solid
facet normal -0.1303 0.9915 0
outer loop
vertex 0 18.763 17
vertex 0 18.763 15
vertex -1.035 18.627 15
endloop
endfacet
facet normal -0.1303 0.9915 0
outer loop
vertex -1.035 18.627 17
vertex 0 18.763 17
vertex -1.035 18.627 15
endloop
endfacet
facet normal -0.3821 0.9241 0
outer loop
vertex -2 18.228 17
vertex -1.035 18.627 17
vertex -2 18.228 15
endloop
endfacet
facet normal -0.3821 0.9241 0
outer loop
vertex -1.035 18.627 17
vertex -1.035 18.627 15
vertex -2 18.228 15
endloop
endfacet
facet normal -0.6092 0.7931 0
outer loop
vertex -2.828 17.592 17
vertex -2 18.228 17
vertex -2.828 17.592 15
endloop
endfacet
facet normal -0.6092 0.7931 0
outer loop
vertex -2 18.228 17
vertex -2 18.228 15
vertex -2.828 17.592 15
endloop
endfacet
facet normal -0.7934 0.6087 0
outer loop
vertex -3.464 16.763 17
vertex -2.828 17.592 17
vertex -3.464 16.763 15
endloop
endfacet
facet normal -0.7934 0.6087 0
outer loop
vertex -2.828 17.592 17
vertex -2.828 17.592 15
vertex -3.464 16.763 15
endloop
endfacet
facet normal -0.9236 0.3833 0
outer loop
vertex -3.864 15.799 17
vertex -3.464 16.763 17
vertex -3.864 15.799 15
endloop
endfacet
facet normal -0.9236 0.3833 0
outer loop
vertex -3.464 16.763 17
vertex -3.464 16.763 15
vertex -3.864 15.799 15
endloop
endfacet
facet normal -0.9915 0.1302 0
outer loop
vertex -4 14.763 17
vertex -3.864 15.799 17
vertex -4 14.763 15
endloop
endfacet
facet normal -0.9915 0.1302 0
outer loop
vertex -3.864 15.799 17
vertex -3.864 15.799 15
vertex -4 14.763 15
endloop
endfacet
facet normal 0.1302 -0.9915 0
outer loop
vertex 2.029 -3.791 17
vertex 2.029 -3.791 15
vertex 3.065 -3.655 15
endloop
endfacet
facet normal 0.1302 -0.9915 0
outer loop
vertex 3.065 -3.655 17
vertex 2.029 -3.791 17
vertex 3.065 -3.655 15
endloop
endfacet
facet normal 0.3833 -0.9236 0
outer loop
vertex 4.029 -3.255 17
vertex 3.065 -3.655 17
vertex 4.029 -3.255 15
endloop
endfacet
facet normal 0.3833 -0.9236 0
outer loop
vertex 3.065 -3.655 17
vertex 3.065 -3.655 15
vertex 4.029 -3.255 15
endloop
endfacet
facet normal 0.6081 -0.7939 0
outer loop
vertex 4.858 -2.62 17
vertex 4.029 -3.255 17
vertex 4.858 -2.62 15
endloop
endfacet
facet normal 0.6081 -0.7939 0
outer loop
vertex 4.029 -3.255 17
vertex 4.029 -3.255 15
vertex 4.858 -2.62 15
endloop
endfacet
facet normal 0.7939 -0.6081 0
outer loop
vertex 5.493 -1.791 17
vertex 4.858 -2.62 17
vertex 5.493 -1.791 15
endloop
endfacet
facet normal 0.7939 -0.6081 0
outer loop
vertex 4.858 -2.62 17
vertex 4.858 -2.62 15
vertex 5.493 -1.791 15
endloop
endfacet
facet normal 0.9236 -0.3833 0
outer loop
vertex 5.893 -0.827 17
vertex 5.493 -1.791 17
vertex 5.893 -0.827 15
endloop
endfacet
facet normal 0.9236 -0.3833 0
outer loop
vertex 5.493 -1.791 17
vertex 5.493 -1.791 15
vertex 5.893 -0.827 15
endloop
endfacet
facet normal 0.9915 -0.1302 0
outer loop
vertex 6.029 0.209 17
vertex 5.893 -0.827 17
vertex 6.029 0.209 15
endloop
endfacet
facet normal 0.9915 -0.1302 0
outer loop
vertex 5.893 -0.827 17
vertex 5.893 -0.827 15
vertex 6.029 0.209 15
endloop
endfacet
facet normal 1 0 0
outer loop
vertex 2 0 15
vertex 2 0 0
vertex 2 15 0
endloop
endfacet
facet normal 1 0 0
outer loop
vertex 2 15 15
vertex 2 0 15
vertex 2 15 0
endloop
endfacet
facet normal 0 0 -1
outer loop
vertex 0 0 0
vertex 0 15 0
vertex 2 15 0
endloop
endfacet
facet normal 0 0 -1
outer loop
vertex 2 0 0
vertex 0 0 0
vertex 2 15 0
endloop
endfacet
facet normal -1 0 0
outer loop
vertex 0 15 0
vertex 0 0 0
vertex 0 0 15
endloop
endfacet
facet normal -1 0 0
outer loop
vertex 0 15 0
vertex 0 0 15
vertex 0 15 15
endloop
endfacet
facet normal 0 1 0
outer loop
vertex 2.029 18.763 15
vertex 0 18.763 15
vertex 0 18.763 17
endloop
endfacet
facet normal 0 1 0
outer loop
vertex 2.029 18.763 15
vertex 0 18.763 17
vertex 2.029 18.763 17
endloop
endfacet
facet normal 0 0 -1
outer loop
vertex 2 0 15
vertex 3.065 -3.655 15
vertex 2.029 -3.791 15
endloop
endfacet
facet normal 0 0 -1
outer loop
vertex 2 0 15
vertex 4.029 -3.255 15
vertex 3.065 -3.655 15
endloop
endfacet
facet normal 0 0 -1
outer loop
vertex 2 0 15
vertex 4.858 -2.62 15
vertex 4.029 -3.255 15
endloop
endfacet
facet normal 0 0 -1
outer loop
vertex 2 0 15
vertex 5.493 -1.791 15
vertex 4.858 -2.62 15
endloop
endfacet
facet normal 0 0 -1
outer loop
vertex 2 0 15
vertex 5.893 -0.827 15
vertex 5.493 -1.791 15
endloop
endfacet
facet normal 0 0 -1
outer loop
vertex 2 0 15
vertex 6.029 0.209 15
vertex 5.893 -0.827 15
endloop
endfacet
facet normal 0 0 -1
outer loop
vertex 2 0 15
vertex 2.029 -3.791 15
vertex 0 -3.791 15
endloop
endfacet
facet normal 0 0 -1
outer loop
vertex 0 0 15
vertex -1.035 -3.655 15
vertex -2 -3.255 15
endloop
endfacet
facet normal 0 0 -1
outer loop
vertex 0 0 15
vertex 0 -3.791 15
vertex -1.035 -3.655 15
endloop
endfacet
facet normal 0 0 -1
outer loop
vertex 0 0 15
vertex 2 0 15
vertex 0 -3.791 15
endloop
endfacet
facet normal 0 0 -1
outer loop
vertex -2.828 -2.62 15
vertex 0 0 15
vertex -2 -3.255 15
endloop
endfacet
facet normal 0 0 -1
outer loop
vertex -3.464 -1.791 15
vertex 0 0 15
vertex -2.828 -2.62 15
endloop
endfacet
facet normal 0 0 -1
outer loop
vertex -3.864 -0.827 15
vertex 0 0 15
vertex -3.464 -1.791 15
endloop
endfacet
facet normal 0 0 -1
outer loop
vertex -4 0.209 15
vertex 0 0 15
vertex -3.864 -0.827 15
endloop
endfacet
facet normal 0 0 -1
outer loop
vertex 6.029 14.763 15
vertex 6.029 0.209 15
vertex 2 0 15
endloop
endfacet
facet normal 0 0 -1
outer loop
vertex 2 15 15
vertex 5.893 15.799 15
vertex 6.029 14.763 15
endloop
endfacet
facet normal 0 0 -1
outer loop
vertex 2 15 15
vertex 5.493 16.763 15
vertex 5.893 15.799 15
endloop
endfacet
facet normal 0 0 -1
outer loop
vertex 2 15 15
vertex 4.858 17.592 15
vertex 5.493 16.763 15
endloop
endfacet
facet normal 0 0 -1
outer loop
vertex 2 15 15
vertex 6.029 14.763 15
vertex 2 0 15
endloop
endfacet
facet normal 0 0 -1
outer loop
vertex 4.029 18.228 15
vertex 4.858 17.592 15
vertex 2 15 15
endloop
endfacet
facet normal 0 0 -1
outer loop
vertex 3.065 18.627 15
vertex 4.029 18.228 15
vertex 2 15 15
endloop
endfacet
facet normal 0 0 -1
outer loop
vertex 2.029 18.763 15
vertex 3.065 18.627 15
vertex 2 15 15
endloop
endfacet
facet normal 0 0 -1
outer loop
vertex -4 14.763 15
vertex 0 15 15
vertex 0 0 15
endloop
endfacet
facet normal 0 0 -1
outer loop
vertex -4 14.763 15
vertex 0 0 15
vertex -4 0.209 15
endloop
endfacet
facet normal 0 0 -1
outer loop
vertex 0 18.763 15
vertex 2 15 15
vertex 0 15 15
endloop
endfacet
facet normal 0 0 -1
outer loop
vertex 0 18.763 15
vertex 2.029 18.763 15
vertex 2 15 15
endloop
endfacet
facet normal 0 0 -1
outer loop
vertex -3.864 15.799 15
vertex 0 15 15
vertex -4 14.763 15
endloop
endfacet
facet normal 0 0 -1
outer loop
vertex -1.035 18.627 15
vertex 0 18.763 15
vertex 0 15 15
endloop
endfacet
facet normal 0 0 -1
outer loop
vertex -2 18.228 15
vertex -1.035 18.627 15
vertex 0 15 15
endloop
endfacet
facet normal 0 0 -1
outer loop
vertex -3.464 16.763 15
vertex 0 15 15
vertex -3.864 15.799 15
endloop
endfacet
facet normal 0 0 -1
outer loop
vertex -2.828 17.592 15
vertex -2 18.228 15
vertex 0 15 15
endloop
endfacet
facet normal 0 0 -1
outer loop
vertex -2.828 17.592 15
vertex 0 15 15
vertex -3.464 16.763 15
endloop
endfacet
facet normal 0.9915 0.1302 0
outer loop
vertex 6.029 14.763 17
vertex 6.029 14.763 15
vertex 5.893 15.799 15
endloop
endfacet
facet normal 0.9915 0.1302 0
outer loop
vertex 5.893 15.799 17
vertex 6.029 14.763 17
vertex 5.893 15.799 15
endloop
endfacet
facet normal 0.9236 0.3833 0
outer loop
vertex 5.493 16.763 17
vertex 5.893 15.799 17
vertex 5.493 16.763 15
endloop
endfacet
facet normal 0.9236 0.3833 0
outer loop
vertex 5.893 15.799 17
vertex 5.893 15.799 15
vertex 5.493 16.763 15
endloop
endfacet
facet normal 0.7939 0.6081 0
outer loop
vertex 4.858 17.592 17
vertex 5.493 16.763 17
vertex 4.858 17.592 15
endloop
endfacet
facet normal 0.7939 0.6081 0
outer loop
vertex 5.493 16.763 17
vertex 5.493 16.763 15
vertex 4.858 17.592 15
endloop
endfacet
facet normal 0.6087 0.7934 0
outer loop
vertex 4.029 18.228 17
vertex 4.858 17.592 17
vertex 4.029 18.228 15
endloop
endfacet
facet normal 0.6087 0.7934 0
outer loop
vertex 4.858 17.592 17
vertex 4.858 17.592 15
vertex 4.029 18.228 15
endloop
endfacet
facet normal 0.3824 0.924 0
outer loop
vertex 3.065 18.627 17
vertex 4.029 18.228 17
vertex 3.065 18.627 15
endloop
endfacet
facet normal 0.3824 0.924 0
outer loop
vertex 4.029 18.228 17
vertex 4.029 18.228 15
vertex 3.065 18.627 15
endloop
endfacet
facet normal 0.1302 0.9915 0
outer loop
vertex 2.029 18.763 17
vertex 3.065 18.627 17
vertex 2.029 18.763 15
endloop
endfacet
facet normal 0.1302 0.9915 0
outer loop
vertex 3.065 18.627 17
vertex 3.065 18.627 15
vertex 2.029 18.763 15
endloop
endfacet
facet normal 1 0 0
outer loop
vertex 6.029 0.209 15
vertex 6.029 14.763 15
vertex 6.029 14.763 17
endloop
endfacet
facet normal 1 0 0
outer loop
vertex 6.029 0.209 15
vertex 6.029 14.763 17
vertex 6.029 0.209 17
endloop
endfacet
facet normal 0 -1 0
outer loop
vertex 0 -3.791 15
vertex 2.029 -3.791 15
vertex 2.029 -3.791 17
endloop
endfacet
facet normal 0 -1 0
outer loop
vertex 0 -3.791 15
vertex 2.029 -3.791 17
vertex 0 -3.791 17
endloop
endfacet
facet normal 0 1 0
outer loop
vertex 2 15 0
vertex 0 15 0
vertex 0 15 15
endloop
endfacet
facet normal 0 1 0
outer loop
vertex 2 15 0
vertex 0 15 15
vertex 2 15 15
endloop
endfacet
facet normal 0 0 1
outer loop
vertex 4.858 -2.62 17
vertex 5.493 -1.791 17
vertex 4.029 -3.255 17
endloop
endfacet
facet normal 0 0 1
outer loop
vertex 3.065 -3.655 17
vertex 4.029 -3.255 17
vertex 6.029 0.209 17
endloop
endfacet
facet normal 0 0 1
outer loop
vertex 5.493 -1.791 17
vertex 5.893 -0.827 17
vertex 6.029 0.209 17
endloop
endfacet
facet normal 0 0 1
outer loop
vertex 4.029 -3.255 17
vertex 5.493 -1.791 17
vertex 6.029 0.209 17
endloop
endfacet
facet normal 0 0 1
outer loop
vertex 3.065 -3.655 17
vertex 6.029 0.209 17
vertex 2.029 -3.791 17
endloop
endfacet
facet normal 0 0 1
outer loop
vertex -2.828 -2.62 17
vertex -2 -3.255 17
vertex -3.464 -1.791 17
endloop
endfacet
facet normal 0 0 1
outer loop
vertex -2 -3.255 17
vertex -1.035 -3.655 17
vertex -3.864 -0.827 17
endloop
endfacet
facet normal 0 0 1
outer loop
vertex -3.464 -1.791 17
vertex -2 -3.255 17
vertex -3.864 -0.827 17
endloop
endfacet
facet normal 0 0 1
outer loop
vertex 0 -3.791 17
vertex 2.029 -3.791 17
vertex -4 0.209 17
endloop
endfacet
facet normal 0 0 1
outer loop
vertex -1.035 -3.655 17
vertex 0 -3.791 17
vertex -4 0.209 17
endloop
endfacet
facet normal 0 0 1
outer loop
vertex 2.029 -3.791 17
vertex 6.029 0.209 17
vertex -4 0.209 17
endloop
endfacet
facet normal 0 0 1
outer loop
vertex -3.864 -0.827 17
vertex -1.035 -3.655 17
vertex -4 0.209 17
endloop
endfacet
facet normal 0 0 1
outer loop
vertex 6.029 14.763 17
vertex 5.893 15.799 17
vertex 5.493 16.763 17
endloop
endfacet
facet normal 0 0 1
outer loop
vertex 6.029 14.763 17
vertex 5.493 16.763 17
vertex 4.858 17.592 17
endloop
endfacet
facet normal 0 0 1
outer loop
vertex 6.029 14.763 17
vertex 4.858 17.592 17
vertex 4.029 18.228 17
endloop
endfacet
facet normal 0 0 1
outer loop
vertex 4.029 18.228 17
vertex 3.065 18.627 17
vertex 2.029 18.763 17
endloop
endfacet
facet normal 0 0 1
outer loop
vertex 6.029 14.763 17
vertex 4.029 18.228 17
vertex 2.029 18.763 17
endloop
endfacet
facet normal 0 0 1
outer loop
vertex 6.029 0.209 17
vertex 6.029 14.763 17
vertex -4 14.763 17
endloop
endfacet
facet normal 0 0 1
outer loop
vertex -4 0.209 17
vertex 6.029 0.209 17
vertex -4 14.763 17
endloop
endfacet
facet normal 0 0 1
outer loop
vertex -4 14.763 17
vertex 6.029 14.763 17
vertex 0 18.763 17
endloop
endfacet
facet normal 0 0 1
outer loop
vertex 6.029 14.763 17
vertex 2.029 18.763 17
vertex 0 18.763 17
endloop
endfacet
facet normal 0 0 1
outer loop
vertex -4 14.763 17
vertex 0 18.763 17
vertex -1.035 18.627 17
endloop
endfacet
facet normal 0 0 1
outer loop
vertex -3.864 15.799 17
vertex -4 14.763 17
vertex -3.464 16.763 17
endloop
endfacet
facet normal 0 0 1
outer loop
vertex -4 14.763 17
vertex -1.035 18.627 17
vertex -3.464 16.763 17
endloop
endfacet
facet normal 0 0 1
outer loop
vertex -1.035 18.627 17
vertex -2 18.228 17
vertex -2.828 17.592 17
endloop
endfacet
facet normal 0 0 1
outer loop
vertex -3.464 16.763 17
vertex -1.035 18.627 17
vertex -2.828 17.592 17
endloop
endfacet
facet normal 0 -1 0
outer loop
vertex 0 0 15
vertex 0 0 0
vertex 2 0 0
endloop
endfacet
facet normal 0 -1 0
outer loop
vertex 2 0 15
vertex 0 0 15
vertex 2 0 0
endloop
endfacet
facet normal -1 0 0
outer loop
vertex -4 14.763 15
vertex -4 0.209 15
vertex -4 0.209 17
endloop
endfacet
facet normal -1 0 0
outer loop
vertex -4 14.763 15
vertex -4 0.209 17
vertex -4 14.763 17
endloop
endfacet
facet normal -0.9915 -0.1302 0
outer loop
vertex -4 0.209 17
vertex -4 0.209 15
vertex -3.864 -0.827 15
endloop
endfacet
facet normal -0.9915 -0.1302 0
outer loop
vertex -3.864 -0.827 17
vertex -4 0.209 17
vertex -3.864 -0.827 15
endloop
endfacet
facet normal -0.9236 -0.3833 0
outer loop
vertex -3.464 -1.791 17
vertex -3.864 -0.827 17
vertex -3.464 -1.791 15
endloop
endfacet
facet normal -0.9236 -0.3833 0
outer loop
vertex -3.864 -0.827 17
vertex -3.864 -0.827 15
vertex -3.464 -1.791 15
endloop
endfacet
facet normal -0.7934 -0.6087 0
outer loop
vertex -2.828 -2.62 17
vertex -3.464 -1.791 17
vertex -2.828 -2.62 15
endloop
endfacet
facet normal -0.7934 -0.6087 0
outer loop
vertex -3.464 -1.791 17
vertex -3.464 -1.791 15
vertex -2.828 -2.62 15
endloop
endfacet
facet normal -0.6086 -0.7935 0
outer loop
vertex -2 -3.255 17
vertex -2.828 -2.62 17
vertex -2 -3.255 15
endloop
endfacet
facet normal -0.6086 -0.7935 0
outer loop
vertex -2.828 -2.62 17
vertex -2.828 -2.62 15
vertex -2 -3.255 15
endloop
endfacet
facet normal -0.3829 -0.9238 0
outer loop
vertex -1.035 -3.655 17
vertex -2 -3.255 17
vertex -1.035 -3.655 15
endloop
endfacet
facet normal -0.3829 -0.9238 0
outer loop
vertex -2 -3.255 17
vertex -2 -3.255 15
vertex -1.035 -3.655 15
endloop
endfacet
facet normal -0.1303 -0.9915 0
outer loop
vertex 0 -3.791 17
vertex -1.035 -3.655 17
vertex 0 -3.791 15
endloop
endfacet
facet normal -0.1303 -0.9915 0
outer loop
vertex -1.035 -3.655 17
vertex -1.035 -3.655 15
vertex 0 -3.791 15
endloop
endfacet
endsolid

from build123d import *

# Parameters (mm, degrees)
SKETCH_W     = 2
SKETCH_H     = 15
PAD_DEPTH    = 15
PAD001_DEPTH = 2


with BuildPart() as part:
    # Sketch → Pad (new body)
    with BuildSketch(Plane.XY):
        with Locations((1, 7.5)):
            Rectangle(SKETCH_W, SKETCH_H)
    extrude(amount=PAD_DEPTH)

    # Sketch001 → Pad001 (join)
    with BuildSketch(Plane.XY.offset(15)):
        with BuildLine():
            Line((0, 18.76349), (2.029385, 18.76349))
            ThreePointArc((6.029385, 14.76349), (4.857812, 17.591917), (2.029385, 18.76349))
            Line((6.029385, 14.76349), (6.029385, 0.208627))
            ThreePointArc((2.029385, -3.791373), (4.857812, -2.6198), (6.029385, 0.208627))
            Line((2.029385, -3.791373), (0, -3.791373))
            ThreePointArc((-4, 0.208627), (-2.828427, -2.6198), (0, -3.791373))
            Line((-4, 0.208627), (-4, 14.76349))
            ThreePointArc((0, 18.76349), (-2.828427, 17.591917), (-4, 14.76349))
        make_face()
    extrude(amount=PAD001_DEPTH)


solid = part.part
